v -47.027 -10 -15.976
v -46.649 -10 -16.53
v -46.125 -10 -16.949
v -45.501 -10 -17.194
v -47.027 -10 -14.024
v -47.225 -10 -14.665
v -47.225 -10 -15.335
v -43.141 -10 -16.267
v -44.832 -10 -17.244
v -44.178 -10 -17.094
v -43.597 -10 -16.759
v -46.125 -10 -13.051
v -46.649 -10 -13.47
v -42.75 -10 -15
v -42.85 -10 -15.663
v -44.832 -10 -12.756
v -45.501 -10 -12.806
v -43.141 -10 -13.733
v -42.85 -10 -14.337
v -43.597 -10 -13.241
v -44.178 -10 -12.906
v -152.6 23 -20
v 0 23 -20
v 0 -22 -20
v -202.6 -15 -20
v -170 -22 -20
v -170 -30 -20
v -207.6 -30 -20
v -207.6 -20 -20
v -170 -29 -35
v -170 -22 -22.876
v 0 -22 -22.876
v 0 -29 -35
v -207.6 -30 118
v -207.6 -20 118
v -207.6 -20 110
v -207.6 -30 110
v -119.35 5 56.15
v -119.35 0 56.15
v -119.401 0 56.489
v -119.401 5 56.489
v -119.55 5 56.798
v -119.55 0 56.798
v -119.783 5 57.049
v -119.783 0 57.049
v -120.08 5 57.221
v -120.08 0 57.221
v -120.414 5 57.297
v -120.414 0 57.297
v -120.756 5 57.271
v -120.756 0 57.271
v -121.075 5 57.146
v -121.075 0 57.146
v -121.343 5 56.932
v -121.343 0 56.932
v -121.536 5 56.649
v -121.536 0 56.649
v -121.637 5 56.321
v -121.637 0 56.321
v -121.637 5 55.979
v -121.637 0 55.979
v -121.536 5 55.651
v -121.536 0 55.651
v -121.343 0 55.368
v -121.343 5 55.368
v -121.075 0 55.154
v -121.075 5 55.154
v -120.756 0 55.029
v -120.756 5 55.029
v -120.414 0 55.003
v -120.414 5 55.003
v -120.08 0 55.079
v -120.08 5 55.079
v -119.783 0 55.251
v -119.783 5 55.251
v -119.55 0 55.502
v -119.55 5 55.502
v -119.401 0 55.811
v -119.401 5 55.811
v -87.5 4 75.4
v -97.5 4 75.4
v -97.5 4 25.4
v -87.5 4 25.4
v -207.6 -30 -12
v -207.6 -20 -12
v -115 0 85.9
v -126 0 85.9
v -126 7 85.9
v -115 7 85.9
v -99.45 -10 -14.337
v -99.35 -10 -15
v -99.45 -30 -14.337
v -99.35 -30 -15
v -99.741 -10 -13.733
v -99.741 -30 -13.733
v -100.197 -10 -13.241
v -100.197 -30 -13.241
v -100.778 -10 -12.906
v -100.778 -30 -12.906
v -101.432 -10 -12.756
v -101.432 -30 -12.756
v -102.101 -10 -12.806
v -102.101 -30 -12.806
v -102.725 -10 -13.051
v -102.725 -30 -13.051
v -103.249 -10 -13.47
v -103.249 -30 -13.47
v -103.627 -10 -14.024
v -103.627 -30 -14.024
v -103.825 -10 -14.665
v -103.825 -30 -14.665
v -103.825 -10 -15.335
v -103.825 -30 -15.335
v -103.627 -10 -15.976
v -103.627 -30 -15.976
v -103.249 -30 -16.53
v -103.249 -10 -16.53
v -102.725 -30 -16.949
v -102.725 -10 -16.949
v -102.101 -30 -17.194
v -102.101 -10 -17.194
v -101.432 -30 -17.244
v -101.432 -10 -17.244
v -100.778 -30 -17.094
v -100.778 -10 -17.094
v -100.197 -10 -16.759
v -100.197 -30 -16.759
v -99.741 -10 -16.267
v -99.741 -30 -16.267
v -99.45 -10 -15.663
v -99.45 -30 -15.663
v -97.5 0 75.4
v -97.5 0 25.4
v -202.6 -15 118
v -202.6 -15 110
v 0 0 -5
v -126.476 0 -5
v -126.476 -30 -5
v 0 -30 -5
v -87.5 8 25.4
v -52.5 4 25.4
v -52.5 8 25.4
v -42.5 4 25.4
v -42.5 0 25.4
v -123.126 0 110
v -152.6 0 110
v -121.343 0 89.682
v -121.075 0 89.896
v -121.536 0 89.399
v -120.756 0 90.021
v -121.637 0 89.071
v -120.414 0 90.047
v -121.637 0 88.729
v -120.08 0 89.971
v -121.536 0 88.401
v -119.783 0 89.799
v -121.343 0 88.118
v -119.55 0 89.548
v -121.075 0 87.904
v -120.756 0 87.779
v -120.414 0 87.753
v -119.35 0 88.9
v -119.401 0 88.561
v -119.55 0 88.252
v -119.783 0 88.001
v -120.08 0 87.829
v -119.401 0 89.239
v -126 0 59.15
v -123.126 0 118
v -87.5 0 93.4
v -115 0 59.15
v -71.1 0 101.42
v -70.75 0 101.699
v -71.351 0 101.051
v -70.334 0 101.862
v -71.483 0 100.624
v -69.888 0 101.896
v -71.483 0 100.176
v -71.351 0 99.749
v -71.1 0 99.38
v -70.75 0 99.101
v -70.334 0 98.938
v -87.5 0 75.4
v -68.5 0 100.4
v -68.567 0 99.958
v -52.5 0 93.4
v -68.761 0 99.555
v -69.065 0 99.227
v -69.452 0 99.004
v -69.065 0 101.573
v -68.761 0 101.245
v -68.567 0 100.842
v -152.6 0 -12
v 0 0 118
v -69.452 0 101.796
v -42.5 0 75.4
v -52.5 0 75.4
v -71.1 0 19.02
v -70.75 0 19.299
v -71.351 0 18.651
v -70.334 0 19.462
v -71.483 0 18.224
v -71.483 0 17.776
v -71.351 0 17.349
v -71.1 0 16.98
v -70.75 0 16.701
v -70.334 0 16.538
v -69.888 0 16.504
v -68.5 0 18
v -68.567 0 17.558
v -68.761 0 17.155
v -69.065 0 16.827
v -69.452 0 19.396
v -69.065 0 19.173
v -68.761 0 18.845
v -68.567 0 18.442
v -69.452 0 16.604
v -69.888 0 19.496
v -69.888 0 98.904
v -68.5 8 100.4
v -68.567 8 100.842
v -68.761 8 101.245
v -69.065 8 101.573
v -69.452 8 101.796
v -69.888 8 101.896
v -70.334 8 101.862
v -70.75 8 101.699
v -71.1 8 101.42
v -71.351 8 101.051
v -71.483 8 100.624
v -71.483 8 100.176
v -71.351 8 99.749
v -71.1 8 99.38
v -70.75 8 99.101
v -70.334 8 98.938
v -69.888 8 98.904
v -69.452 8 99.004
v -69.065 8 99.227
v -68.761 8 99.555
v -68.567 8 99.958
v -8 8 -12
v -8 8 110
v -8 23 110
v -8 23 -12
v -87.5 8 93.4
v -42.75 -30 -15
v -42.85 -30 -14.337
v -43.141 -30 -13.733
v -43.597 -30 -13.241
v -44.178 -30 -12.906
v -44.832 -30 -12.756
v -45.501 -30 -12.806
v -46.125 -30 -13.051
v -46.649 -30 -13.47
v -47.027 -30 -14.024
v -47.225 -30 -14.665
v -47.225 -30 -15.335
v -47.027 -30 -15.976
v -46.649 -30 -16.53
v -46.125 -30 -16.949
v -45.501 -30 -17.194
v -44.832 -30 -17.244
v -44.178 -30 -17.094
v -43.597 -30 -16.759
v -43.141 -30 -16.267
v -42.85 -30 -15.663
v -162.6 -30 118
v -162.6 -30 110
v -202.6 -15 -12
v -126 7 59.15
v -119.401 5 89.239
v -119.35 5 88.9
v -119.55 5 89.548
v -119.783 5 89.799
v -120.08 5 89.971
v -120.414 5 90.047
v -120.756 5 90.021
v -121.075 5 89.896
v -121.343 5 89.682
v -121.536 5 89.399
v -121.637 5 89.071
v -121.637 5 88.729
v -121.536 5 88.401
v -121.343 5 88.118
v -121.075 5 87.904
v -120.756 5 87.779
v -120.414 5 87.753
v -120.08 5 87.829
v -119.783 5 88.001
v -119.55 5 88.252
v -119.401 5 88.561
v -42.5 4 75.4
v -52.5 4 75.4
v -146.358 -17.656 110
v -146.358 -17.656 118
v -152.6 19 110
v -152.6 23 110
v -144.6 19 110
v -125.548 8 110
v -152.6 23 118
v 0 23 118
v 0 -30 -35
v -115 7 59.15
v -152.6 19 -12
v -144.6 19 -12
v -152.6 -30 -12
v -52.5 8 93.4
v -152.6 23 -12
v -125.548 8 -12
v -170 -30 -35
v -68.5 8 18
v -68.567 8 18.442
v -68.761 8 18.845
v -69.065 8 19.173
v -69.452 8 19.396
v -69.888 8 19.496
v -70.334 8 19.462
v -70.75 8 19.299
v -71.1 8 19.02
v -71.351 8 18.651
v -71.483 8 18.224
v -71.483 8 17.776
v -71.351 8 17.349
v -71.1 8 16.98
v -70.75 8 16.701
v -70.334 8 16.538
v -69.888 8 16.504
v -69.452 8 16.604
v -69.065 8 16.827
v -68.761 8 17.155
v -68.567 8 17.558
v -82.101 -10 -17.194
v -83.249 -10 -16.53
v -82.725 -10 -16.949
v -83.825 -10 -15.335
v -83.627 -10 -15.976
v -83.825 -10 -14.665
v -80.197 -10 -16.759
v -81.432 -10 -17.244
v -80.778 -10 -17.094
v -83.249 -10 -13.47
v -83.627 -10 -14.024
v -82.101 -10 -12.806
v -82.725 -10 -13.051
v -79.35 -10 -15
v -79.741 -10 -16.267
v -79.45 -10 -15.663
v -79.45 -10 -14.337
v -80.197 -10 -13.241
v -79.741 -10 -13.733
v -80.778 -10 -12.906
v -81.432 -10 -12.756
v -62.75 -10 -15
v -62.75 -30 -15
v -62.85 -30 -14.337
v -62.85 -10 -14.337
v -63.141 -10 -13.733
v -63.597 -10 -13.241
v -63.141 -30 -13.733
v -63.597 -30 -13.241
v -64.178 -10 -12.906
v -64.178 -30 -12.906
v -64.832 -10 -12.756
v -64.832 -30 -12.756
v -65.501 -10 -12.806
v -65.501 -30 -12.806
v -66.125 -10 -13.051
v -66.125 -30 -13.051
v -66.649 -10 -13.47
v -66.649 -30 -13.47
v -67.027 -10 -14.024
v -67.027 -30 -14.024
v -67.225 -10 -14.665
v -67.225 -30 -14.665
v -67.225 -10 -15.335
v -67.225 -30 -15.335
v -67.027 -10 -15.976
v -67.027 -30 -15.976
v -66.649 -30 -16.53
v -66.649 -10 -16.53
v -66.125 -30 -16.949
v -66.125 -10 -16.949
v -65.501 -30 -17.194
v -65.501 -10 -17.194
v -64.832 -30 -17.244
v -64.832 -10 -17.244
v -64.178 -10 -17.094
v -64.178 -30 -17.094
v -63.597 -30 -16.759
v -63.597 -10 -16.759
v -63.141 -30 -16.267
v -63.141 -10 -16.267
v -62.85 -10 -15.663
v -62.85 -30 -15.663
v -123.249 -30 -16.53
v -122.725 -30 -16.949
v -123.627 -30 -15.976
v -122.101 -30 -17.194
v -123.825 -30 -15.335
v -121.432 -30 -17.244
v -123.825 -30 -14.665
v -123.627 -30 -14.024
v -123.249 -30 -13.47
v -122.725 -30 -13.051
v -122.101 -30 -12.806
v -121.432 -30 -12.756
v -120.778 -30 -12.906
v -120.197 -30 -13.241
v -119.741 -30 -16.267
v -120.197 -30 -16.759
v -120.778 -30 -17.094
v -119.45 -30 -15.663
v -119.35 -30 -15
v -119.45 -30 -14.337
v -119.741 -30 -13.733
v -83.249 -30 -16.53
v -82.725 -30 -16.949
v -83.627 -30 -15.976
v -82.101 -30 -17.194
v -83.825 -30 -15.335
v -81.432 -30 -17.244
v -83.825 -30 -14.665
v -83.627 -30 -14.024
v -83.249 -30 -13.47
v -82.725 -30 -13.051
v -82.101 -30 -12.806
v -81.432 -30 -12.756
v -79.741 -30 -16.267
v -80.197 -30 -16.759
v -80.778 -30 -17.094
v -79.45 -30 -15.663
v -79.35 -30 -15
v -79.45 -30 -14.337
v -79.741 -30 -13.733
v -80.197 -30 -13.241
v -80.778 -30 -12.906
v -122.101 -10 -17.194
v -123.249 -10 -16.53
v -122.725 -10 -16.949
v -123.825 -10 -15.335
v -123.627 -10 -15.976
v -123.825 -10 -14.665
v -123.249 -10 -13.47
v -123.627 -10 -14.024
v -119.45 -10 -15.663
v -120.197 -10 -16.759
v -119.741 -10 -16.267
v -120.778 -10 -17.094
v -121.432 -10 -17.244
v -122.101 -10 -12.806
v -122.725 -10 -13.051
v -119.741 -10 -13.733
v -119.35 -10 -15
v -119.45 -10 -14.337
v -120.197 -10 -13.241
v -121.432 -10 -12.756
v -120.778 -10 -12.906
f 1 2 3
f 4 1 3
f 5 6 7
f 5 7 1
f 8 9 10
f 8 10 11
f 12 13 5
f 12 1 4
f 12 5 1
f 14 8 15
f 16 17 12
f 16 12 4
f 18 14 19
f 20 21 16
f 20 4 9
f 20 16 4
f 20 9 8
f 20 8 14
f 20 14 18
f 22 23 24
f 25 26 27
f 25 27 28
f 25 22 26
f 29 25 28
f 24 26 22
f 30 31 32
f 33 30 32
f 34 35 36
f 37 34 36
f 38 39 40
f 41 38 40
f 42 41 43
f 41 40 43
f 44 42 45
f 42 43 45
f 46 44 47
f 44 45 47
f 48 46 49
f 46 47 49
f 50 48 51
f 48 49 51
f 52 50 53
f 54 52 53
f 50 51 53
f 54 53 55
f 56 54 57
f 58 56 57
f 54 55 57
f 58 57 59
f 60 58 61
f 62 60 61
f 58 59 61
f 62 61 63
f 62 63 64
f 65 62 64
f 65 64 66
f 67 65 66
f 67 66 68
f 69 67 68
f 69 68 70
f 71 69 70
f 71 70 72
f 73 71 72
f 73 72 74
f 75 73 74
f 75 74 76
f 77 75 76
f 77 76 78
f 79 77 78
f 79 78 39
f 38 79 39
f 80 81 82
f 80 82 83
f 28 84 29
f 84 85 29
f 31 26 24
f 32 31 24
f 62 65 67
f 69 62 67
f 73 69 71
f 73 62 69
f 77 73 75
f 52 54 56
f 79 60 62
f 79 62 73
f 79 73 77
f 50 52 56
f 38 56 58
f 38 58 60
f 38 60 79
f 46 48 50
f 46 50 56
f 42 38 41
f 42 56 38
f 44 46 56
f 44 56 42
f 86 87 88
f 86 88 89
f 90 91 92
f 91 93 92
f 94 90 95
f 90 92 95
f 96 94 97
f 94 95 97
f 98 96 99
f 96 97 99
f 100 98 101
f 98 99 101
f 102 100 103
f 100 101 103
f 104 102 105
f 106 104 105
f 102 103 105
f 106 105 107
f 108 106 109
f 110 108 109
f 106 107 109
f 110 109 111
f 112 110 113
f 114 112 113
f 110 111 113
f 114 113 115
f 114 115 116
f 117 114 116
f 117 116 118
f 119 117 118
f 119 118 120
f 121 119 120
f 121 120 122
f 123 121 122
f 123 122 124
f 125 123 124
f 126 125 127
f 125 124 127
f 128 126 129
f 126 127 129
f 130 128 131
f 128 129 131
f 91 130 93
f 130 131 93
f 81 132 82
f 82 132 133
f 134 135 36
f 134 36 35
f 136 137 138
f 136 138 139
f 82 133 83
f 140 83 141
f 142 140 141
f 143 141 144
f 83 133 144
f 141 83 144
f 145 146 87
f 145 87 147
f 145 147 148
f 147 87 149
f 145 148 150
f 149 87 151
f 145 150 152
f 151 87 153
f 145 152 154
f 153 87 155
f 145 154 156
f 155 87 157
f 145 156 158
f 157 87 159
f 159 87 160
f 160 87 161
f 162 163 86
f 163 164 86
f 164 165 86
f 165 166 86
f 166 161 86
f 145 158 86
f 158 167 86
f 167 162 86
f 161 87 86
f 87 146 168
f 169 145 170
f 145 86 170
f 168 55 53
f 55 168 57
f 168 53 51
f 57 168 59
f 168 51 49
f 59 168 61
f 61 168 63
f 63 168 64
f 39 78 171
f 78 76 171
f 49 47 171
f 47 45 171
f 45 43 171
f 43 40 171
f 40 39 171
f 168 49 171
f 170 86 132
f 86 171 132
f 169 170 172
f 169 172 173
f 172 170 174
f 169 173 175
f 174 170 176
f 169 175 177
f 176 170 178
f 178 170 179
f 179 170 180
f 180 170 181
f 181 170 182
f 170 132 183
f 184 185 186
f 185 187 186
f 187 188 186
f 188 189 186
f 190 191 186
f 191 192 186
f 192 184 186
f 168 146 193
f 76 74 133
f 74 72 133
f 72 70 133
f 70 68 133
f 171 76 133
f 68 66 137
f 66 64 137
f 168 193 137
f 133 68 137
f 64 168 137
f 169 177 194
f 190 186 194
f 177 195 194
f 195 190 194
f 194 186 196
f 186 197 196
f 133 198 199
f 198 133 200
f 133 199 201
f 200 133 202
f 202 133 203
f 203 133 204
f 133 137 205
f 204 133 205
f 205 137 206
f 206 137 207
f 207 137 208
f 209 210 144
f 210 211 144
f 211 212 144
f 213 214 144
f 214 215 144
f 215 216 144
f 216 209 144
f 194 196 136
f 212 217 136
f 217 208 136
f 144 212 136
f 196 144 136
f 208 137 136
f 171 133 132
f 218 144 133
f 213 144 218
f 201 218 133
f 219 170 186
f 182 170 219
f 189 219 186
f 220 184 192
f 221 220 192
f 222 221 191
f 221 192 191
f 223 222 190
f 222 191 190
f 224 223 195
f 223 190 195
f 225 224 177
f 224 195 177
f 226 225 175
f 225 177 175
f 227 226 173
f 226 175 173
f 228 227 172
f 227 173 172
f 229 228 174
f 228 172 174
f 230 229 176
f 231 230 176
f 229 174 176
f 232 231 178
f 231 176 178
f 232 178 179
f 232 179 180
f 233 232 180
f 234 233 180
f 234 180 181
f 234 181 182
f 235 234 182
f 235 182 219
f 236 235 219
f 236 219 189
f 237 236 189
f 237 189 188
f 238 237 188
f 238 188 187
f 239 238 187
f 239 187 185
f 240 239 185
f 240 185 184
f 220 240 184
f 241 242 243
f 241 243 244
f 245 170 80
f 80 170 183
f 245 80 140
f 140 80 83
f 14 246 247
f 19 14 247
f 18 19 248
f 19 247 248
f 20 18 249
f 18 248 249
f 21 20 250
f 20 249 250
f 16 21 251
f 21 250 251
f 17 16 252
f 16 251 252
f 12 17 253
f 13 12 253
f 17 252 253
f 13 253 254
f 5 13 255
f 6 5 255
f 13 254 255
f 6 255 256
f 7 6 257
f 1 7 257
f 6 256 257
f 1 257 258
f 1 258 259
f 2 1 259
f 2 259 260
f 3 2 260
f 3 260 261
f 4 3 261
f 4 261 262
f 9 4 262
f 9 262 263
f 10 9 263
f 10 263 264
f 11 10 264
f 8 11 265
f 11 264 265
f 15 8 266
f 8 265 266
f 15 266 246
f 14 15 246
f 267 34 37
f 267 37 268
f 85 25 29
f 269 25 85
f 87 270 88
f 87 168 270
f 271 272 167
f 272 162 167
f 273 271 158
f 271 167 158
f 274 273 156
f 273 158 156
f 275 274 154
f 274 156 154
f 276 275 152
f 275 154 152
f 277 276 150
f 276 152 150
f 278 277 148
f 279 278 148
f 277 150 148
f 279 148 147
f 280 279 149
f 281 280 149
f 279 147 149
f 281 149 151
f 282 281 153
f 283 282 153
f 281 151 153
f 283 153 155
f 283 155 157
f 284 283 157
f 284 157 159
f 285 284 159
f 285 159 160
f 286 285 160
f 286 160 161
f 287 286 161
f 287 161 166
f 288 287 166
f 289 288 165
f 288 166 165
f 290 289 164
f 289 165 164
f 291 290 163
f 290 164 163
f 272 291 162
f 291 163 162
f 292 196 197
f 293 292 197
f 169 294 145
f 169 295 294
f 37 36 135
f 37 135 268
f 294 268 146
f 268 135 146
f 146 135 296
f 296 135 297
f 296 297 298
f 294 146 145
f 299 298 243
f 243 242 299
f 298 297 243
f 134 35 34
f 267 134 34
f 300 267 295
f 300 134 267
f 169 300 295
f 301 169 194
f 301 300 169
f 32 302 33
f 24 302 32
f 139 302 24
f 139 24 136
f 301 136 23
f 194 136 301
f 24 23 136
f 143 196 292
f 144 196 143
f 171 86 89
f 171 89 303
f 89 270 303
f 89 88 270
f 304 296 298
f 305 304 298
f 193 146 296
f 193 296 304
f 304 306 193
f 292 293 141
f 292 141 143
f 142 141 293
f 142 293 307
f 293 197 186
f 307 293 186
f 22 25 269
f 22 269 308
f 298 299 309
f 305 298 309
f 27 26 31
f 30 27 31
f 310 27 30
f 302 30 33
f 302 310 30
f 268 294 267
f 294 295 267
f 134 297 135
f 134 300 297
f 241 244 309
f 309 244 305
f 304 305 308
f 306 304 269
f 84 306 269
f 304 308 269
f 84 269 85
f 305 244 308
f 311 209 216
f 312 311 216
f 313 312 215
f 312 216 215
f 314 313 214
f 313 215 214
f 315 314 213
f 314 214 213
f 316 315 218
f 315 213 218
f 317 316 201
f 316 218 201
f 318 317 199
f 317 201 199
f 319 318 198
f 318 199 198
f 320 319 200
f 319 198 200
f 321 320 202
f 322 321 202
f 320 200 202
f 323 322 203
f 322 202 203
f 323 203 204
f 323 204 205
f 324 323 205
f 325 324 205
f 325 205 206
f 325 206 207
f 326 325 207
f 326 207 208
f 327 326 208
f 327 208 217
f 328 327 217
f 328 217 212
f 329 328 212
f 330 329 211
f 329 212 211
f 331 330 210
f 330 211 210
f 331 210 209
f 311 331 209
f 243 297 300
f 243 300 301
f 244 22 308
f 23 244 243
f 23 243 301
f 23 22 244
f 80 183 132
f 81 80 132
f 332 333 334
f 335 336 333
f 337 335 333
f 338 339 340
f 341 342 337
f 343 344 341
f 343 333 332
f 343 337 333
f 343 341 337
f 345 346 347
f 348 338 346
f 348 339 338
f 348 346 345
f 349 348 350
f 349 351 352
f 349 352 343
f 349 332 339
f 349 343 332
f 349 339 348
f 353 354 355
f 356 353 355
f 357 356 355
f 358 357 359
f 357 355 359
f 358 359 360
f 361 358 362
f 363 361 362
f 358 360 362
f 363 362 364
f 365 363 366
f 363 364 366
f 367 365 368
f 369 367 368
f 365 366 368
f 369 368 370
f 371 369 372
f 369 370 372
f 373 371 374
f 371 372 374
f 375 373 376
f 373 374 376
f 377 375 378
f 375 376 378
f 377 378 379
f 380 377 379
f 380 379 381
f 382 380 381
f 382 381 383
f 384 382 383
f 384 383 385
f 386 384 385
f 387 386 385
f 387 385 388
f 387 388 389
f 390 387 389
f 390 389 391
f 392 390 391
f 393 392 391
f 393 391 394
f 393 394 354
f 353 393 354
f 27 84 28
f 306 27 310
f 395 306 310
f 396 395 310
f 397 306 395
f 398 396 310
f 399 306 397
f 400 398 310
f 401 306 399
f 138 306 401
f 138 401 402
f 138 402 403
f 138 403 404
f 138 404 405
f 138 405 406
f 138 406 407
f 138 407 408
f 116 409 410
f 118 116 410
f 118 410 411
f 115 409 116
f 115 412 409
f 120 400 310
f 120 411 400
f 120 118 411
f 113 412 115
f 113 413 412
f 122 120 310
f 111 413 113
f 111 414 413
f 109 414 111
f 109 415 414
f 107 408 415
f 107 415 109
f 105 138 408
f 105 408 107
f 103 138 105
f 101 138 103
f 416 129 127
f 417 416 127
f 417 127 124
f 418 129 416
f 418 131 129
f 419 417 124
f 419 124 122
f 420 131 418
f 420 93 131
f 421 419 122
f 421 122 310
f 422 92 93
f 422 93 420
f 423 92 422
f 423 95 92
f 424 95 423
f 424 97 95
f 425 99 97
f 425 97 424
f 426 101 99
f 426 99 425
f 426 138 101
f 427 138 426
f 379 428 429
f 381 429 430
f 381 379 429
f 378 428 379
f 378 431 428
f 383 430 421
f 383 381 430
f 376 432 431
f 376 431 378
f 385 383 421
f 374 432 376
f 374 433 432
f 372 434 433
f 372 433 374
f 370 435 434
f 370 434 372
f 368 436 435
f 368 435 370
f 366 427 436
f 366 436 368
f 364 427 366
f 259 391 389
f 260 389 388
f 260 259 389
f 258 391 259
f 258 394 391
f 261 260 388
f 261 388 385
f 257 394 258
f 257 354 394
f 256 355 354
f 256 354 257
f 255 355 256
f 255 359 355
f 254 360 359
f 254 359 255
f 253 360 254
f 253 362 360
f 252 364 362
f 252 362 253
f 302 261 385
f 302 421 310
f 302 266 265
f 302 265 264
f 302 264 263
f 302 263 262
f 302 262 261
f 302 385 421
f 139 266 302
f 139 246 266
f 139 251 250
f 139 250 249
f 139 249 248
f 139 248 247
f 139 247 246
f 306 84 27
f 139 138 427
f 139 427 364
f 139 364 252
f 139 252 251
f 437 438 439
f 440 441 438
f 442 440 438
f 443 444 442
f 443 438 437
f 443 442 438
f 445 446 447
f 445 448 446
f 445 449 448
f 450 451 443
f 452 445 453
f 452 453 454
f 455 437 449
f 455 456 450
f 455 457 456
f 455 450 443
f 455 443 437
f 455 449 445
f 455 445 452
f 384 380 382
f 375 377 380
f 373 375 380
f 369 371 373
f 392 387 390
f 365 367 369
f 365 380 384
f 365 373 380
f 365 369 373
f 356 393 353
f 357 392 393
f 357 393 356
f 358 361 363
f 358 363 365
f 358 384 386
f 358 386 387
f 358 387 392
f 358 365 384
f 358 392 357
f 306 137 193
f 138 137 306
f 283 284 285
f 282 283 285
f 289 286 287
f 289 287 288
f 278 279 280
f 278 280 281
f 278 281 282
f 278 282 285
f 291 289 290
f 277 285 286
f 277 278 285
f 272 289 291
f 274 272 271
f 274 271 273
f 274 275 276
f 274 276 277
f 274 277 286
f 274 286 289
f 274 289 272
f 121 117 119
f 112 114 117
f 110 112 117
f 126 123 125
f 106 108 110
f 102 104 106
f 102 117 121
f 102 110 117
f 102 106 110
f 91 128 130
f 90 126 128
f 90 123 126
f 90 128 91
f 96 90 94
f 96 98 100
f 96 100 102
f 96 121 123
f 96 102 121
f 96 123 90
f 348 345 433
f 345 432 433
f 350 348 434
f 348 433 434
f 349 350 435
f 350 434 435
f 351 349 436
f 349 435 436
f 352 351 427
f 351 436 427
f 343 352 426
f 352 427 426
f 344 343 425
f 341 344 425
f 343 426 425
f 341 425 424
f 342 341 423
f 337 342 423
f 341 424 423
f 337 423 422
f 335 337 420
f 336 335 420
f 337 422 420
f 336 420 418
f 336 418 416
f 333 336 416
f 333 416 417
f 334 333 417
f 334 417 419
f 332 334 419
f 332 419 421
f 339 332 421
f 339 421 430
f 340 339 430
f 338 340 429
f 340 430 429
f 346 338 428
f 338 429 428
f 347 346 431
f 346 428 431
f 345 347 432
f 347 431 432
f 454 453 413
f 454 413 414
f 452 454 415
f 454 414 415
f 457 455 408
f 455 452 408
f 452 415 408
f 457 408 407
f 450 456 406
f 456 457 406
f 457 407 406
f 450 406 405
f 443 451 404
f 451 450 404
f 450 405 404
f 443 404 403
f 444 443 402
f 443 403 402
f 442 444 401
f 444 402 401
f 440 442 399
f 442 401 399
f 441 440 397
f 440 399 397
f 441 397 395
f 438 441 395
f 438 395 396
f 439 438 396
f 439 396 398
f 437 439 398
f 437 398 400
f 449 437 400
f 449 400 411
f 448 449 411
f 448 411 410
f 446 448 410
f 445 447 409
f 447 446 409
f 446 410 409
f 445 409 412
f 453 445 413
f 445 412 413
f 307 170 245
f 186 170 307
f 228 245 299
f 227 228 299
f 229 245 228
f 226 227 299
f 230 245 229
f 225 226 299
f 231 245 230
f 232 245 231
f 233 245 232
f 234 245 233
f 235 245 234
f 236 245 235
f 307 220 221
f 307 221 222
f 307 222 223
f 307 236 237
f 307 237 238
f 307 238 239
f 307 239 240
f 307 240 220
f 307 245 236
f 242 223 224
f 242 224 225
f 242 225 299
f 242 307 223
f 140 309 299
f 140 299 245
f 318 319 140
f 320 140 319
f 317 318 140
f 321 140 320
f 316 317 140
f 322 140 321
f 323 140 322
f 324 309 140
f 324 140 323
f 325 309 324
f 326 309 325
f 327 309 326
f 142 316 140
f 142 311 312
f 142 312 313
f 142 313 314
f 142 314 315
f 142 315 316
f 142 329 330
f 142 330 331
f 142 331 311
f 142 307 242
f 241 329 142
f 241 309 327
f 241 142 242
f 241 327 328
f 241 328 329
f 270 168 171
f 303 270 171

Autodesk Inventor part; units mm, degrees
ref_plane "YZ Plane" through (0, 0, 0) normal (1, 0, 0) x (0, 1, 0)
ref_plane "XZ Plane" through (0, 0, 0) normal (0, 1, 0) x (-1, 0, 0)
sketch "Sketch1" plane through (0, 0, 0) normal (0, 1, 0) x (-1, 0, 0)
  line L0 (0, 0) -> (159.6, 0)
  line L1 (159.6, 46) -> (159.6, 118)
  line L2 (159.6, 118) -> (0, 118)
  line L3 (0, 118) -> (0, 0)
  line L4 (159.6, 118) -> (159.6, 46)
  line L5 (0, 0) -> (113, 0)
  line L6 (113, 0) -> (159.6, 46)
  line L7 (159.6, 118) -> (167.6, 118)
  line L8 (167.6, 118) -> (167.6, 46)
  line L9 (167.6, 46) -> (159.6, 46)
  line L10 (159.6, 46) -> (159.6, 118)
  line L11 (113, 0) -> (0, 0)
  line L12 (0, 0) -> (0, -8)
  line L13 (0, -8) -> (113, -8)
  line L14 (113, -8) -> (113, 0)
  line L15 (0, 0) -> (0, 10)
  line L16 (0, 10) -> (9, 10)
  circle A0 centre (9, 10) radius 2.25
  line L17 (159.6, 118) -> (159.6, 89)
  line L18 (159.6, 89) -> (149.6, 89)
  circle A1 centre (149.6, 89) radius 2.25
  line L19 (159.6, 118) -> (159.6, 0)
  dimension "d0" = 159.6
  dimension "d2" = 72
  dimension "d3" = 113
  dimension "d4" = 8
  dimension "d5" = 8
  dimension "d6" = 10
  dimension "d7" = 9
  dimension "d8" = 4.5
  dimension "d9" = 29
  dimension "d10" = 10
  dimension "d11" = 4.5
  dimension "d14" = 118
extrude "Extrusion2" add sketch "Sketch1" along normal blind 8 contours L3 L2 L1 L6 L0 | L0 L14 L13 L12 | L1 L7 L8 L9
sketch "Sketch2" plane through (0, 8, 0) normal (0, 1, 0) x (1, 0, 0)
  line L0 (-113, 8) -> (-113, 0) projected
  line L1 (-159.6, -46) -> (-113, 0)
  line L2 (-113, 0) -> (-94.4074, 18.3532)
  line L3 (-113, 0) -> (-159.6, -46) projected
  line L4 (-113, 0) -> (-159.6, -46)
  line L5 (-159.6, -46) -> (-175.759, -61.951)
  line L6 (-175.759, -61.951) -> (-174.3006, -39.4963)
  line L7 (-174.3006, -39.4963) -> (-106.8014, 20.2158)
  line L8 (-106.8014, 20.2158) -> (-94.4074, 18.3532)
  point P0 (0, 0)
extrude "Extrusion3" cut sketch "Sketch2" against normal blind 10
sketch "Sketch3" plane through (0, 0, 0) normal (0, -1, 0) x (1, 0, 0)
  line L0 (-167.6, 118) -> (0, 118) projected
  line L1 (-167.6, 118) -> (-167.6, 92.4)
  line L2 (-167.6, 53.897) -> (-167.6, 118) projected
  line L3 (-167.6, 92.4) -> (-128, 92.4)
  line L4 (-128, 92.4) -> (-120.5, 92.4)
  line L5 (-120.5, 92.4) -> (-120.5, 88.9)
  line L6 (-120.5, 88.9) -> (-128, 88.9)
  line L7 (-128, 88.9) -> (-128, 92.4)
  line L8 (-120.5, 88.9) -> (-120.5, 56.15)
  line L9 (-120.5, 88.9) -> (-87.75, 88.9) construction
  circle A0 centre (-120.5, 88.9) radius 1.15
  circle A1 centre (-120.5, 56.15) radius 1.15
  line L10 (-120.5, 88.9) -> (-120.5, 90.9)
  line L11 (-120.5, 88.9) -> (-120.5, 85.9)
  line L12 (-120.5, 56.15) -> (-120.5, 59.15)
  line L13 (-120.5, 59.15) -> (-115, 59.15)
  line L14 (-120.5, 85.9) -> (-126, 85.9)
  line L15 (-126, 85.9) -> (-115, 85.9)
  line L16 (-115, 85.9) -> (-115, 59.15)
  line L17 (-115, 59.15) -> (-126, 59.15)
  line L18 (-126, 59.15) -> (-126, 85.9)
  point P0 (0, 0)
  dimension "d19" = 25.6
  dimension "d20" = 39.6
  dimension "d21" = 7.5
  dimension "d22" = 3.5
  dimension "d23" = 32.75
  dimension "d24" = 90
  dimension "d25" = 2.3
  dimension "d26" = 2.3
  dimension "d29" = 2
  dimension "d30" = 3
  dimension "d31" = 3
  dimension "d32" = 5.5
  dimension "d33" = 5.5
extrude "Extrusion4" cut sketch "Sketch3" against normal blind 5 contours A0 L5 L6 | L6 L8 A0 | A0 L8 L5 | A1
sketch "Sketch5" plane through (0, 8, 0) normal (0, 1, 0) x (1, 0, 0)
  circle A0 centre (-9, -10) radius 2.25 projected
  circle A1 centre (-149.6, -89) radius 2.25 projected
  line L0 (-9, -10) -> (-149.6, -89)
  line L1 (-149.6, -89) -> (-116.8523, -147.2827)
  line L2 (-116.8523, -147.2827) -> (-175.4275, -43.0335)
  line L3 (-149.6, -89) -> (-9, -10)
  line L4 (-79.3, -49.5) -> (-9, -10)
  line L5 (-149.6, -89) -> (-144.7015, -97.7181)
  line L6 (-116.8523, -147.2827) -> (-175.4275, -43.0335)
  line L7 (-175.4275, -43.0335) -> (-34.8275, 35.9665)
  line L8 (-34.8275, 35.9665) -> (23.7477, -68.2827)
  line L9 (23.7477, -68.2827) -> (-116.8523, -147.2827)
  circle A2 centre (-9, -10) radius 4.5 projected
  line L10 (-9, -10) -> (-4.1015, -18.7181)
  line L11 (-4.1015, -18.7181) -> (-1.6523, -23.0771)
  line L12 (-1.6523, -23.0771) -> (8.1447, -40.5133)
  line L13 (8.1447, -40.5133) -> (10.594, -44.8723)
  line L14 (-144.7015, -97.7181) -> (-142.2523, -102.0771)
  line L15 (-142.2523, -102.0771) -> (-132.4553, -119.5133)
  line L16 (-132.4553, -119.5133) -> (-130.006, -123.8723)
  line L17 (-149.6, -89) -> (-154.4985, -80.2819)
  line L18 (-154.4985, -80.2819) -> (-156.9477, -75.9229)
  line L19 (-9, -10) -> (-13.8985, -1.2819)
  line L20 (-13.8985, -1.2819) -> (-16.3477, 3.0771)
  line L21 (-167.6, -53.897) -> (-167.6, -118) projected
  line L22 (-167.6, -118) -> (0, -118)
  line L23 (0, -118) -> (0, 8)
  line L24 (0, 8) -> (-167.6, 8)
  line L25 (-167.6, 8) -> (-167.6, -118)
  line L26 (-16.3477, 3.0771) -> (-156.9477, -75.9229)
  line L27 (-154.4985, -80.2819) -> (-13.8985, -1.2819)
  line L28 (-4.1015, -18.7181) -> (-144.7015, -97.7181)
  line L29 (-142.2523, -102.0771) -> (-1.6523, -23.0771)
  line L30 (8.1447, -40.5133) -> (-132.4553, -119.5133)
  line L31 (-130.006, -123.8723) -> (10.594, -44.8723)
  line L32 (-4.1015, -18.7181) -> (7.818, -12.0208)
  line L33 (-1.6523, -23.0771) -> (4.3075, -19.7285)
  line L34 (-13.8985, -1.2819) -> (7.818, 10.9201)
  line L35 (-16.3477, 3.0771) -> (3.62, 14.2965)
  line L36 (-144.7015, -97.7181) -> (-142.2523, -102.0771)
  line L37 (-142.2523, -102.0771) -> (-178.8351, -122.6322)
  line L38 (-178.8351, -122.6322) -> (-181.2843, -118.2731)
  line L39 (-181.2843, -118.2731) -> (-144.7015, -97.7181)
  line L40 (-154.4985, -80.2819) -> (-156.9477, -75.9229)
  line L41 (-156.9477, -75.9229) -> (-183.573, -90.883)
  line L42 (-183.573, -90.883) -> (-181.1237, -95.242)
  line L43 (-181.1237, -95.242) -> (-154.4985, -80.2819)
  line L44 (0, 8) -> (-104.8957, 8) projected
  line L45 (0, 8) -> (-5, 8)
  line L46 (-5, 8) -> (-5, 3)
  line L47 (-5, 3) -> (0, 3)
  line L48 (0, 3) -> (0, 8)
  line L49 (-104.8957, 8) -> (-167.6, -53.897) projected
  line L50 (-104.8957, 8) -> (-167.6, -53.897)
  line L51 (-167.6, -53.897) -> (-164.0874, -57.4554)
  line L52 (-164.0874, -57.4554) -> (-101.3831, 4.4416)
  line L53 (-101.3831, 4.4416) -> (-104.8957, 8)
  line L54 (0, -118) -> (0, 8) projected
  line L55 (0, 3) -> (0, 8)
  line L56 (0, 8) -> (-113.2487, 8)
  line L57 (-113.2487, 8) -> (-113.2487, 3)
  line L58 (-113.2487, 3) -> (0, 3)
  line L59 (-5, 8) -> (0, 8)
  line L60 (0, 8) -> (0, -118)
  line L61 (0, -118) -> (-5, -118)
  line L62 (-5, -118) -> (-5, 8)
  line L63 (-167.6, -118) -> (0, -118) projected
  line L64 (-167.6, -118) -> (-162.6, -118)
  line L65 (-162.6, -118) -> (-162.6, -39.4397)
  line L66 (-162.6, -39.4397) -> (-167.6, -39.4397)
  line L67 (-167.6, -39.4397) -> (-167.6, -118)
  line L68 (-167.6, -118) -> (0, -118) projected
  line L69 (0, -118) -> (-186.0038, -118)
  line L70 (-186.0038, -118) -> (-186.0038, -113)
  line L71 (-186.0038, -113) -> (0, -113)
  line L72 (0, -113) -> (0, -118)
  point P0 (0, 0)
  point P1 (-162.6, -107.7748)
  point P2 (-162.6, -84.834)
  point P3 (-6.2777, 3)
  point P4 (-5, -7.9384)
  point P5 (-5, -12.0616)
  point P6 (-5, -19.2229)
  point P7 (-5, -24.9581)
  point P8 (-5, -47.899)
  point P9 (-120.8633, -113)
  point P10 (-161.6922, -113)
  point P11 (-162.6, -113.51)
  point P12 (-162.6, -113)
  point P13 (-5, -113)
  point P14 (-110.6561, -113)
  point P15 (-5, -53.6342)
  point P16 (-162.6, -79.0988)
  point P17 (-162.6, -55.9871)
  point P18 (-102.8435, 3)
  point P19 (-16.485, 3)
  point P20 (-16.3044, 3)
  dimension "d45" = 10
  dimension "d46" = 10
  dimension "d47" = 5
  dimension "d48" = 20
  dimension "d49" = 5
  dimension "d50" = 5
  dimension "d51" = 20
  dimension "d52" = 5
  dimension "d53" = 10
  dimension "d54" = 5
  dimension "d55" = 10
  dimension "d56" = 5
  dimension "d57" = 5
  dimension "d58" = 5
  dimension "d59" = 5
  dimension "d60" = 5
  dimension "d61" = 5
extrude "Extrusion7" cut sketch "Sketch3" against normal blind 7 contours L15 L16 L13 L8 | L8 L17 L18 L14
sketch "Sketch7" plane through (0, 0, 0) normal (0, -1, 0) x (1, 0, 0)
  line L0 (-167.6, 118) -> (0, 118) projected
  line L1 (0, 118) -> (-70, 118)
  line L2 (-70, 118) -> (-70, 100.4)
  line L3 (-70, 100.4) -> (-70, 18)
  circle A0 centre (-70, 100.4) radius 1.5
  circle A1 centre (-70, 18) radius 1.5
  point P0 (0, 0)
  dimension "d66" = 70
  dimension "d67" = 17.6
  dimension "d68" = 82.4
  dimension "d69" = 3
  dimension "d70" = 3
extrude "Extrusion8" cut sketch "Sketch7" against normal blind 30
sketch "Sketch8" plane through (0, 0, 0) normal (0, -1, 0) x (1, 0, 0)
  circle A0 centre (-70, 100.4) radius 1.5 projected
  line L0 (-70, 100.4) -> (-70, 93.4)
  line L1 (-70, 93.4) -> (-52.5, 93.4)
  line L2 (-52.5, 93.4) -> (-87.5, 93.4)
  line L3 (-87.5, 93.4) -> (-87.5, 25.4)
  line L4 (-87.5, 25.4) -> (-52.5, 25.4)
  line L5 (-52.5, 25.4) -> (-52.5, 93.4)
  point P0 (0, 0)
  dimension "d73" = 7
  dimension "d74" = 17.5
  dimension "d75" = 35
  dimension "d76" = 68
extrude "Extrusion9" cut sketch "Sketch8" against normal blind 23 contours L1 L5 L4 L3 L2
extrude "Extrusion10" add sketch "Sketch5" along normal blind 15 contours L62 L47 L23 L32 L8 A2 | L8 L28 L62 | L8 L35 L24 L46 L34 L58 | L34 L46 L58 | L46 L34 L23 L47 | L32 L23 L33 L8 | L8 L29 L62 L28 | L26 L58 L7 L24 L8 | L8 L24 L35 | L65 L39 L21 L43 | L43 L21 L41 L65 | L46 L24 L23 L34 | L33 L23 L8 | L8 L23 L30 L62 L29 | L58 L52 L53 L24 L7 | L65 L41 L21 L2 | L2 L21 L51 L52 L65 | L65 L71 L21 L39 | L30 L23 L31 L62 | L52 L65 L49 L7 | L7 L49 L58 L52 | L58 L49 L53 L52 | L52 L51 L49 L65 | L71 L37 L65 | L65 L37 L21 L71 | L71 L30 L22 L1 | L1 L22 L65 L37 L71 | L71 L31 L22 L30 | L31 L23 L9 L62 | L65 L22 L21 L37 | L71 L9 L22 L31 | L9 L23 L71 L62 | L71 L62 L22 L9 | L71 L23 L22 L62
sketch "Sketch10" plane through (0, 0, 0) normal (0, -1, 0) x (1, 0, 0)
  line L0 (-52.5, 93.4) -> (-87.5, 93.4) projected
  line L1 (-70, 93.4) -> (-42.5, 93.4)
  line L2 (-42.5, 93.4) -> (-42.5, 75.4)
  line L3 (-42.5, 75.4) -> (-42.5, 25.4)
  line L4 (-42.5, 75.4) -> (-97.5, 75.4)
  line L5 (-97.5, 75.4) -> (-97.5, 25.4)
  line L6 (-97.5, 25.4) -> (-42.5, 25.4)
  line L7 (-42.5, 25.4) -> (-42.5, 75.4)
  point P0 (0, 0)
  point P1 (-42.5, 25.4)
  dimension "d81" = 27.5
  dimension "d82" = 18
  dimension "d83" = 50
  dimension "d84" = 55
  dimension "d87" = 50
extrude "Extrusion11" cut sketch "Sketch10" against normal blind 4
sketch "Sketch11" plane through (0, 8, 0) normal (0, 1, 0) x (1, 0, 0)
  line L0 (-162.6, -55.9871) -> (-102.8435, 3) projected
  line L1 (-162.6, -55.9871) -> (-102.8435, -55.9871)
  line L2 (-102.8435, -55.9871) -> (-102.8435, 3)
  line L3 (-102.8435, 3) -> (-162.6, 3)
  line L4 (-162.6, 3) -> (-162.6, -55.9871)
  point P0 (0, 0)
extrude "Extrusion12" cut sketch "Sketch11" along normal blind 20 contours L4 L3 L0
sketch "Sketch12" plane through (0, 8, 0) normal (0, 1, 0) x (1, 0, 0)
  line L0 (0, 8) -> (-104.8957, 8) projected
  line L1 (-167.6, -53.897) -> (-104.8957, -53.897)
  line L2 (-104.8957, -53.897) -> (-104.8957, 8)
  line L3 (-104.8957, 8) -> (-167.6, 8)
  line L4 (-167.6, 8) -> (-167.6, -53.897)
  line L5 (-104.8957, 8) -> (-109.9609, 3) projected
  line L6 (-162.6, -48.9614) -> (-109.9609, 3) projected
  line L7 (-109.9609, 3) -> (-162.6, 3)
  line L8 (-162.6, 3) -> (-162.6, -48.9614)
  line L9 (-162.6, -48.9614) -> (-109.9609, -48.9614)
  line L10 (-109.9609, -48.9614) -> (-109.9609, 3)
  point P0 (0, 0)
extrude "Extrusion13" add sketch "Sketch12" against normal blind 8 contours L8 L7 L6
sketch "Sketch13" plane through (0, 8, 0) normal (0, 1, 0) x (1, 0, 0)
  line L0 (-104.8957, 8) -> (-109.9609, 3) projected
  line L1 (-167.6, -53.897) -> (-167.6, -118) projected
  line L2 (-104.8957, 8) -> (-167.6, 8)
  line L3 (-167.6, 8) -> (-167.6, -53.897)
  line L4 (-167.6, -53.897) -> (-104.8957, -53.897)
  line L5 (-104.8957, -53.897) -> (-104.8957, 8)
  line L6 (-167.6, -53.897) -> (-162.6, -48.9614) projected
  line L7 (-109.9609, 3) -> (-162.6, 3)
  line L8 (-162.6, 3) -> (-162.6, -48.9614)
  line L9 (-162.6, -48.9614) -> (-109.9609, -48.9614)
  line L10 (-109.9609, -48.9614) -> (-109.9609, 3)
  point P0 (0, 0)
extrude "Extrusion14" add sketch "Sketch13" along normal blind 15 contours L0 L7 L8 L6 L3 L2
extrude "Extrusion15" add sketch "Sketch13" against normal blind 8 contours L0 L7 L8 L6 L3 L2
sketch "Sketch14" plane through (0, 8, 0) normal (0, 1, 0) x (1, 0, 0)
  circle A0 centre (-9, -10) radius 2.25 projected
  circle A1 centre (-9, -10) radius 2.25
  circle A2 centre (-149.6, -89) radius 2.25 projected
  circle A3 centre (-149.6, -89) radius 2.25
  point P0 (0, 0)
extrude "Extrusion16" add sketch "Sketch14" against normal blind 8
sketch "Sketch15" plane through (-162.6, 8, -3) normal (0, 0, 1) x (1, 0, 0)
  line L0 (0, 0) -> (0, 15) projected
  line L1 (0, 0) -> (187.1145, 0)
  line L2 (187.1145, 0) -> (187.1145, 32.8741)
  line L3 (187.1145, 32.8741) -> (0, 32.8741)
  line L4 (0, 32.8741) -> (0, 0)
  line L5 (0, 0) -> (-28.6153, 0)
  line L6 (-28.6153, 0) -> (-28.6153, 26.9098)
  line L7 (-28.6153, 26.9098) -> (0, 26.9098)
  line L8 (0, 26.9098) -> (0, 0)
  point P0 (162.6, -8)
extrude "Extrusion17" cut sketch "Sketch15" along normal mid plane 900
sketch "Sketch16" plane through (0, 8, 0) normal (0, 1, 0) x (1, 0, 0)
  line L0 (-167.6, 8) -> (0, 8) projected
  line L1 (0, 8) -> (-167.6, 8)
  line L2 (-167.6, 8) -> (-167.6, 20)
  line L3 (-167.6, 20) -> (0, 20)
  line L4 (0, 20) -> (0, 8)
  point P0 (0, 0)
  dimension "d100" = 12
extrude "Extrusion18" add sketch "Sketch16" against normal blind 8
sketch "Sketch17" plane through (0, 0, 0) normal (0, -1, 0) x (1, 0, 0)
  line L0 (-167.6, 118) -> (0, 118) projected
  line L1 (-167.6, -20) -> (0, -20) projected
  line L2 (-167.6, 118) -> (-152.6, 118)
  line L3 (-152.6, 118) -> (-152.6, -20)
  line L4 (-152.6, -20) -> (-167.6, -20)
  line L5 (-167.6, -20) -> (-167.6, 118)
  point P0 (0, 0)
  dimension "d103" = 15
extrude "Extrusion19" cut sketch "Sketch17" against normal blind 8
sketch "Sketch18" plane through (0, 0, 0) normal (0, -1, 0) x (1, 0, 0)
  line L0 (0, -20) -> (-152.6, -20) projected
  line L1 (-152.6, -20) -> (-152.6, 118) projected
  line L2 (0, -20) -> (-152.6, -20)
  line L3 (-152.6, -20) -> (-152.6, -5)
  line L4 (-152.6, -5) -> (0, -5)
  line L5 (0, -5) -> (0, -20)
  line L6 (-152.6, 118) -> (-137.6, 118)
  line L7 (-137.6, 118) -> (-137.6, -5)
  line L8 (-137.6, -5) -> (-152.6, -5)
  line L9 (-152.6, -5) -> (-152.6, 118)
  point P0 (0, 0)
  dimension "d106" = 15
  dimension "d107" = 15
extrude "Extrusion20" add sketch "Sketch18" along normal blind 30
sketch "Sketch19" plane through (-152.6, 8, -20) normal (-1, 0, 0) x (0, 0, 1)
  line L0 (138, 0) -> (138, -38) projected
  line L1 (0, -38) -> (138, -38)
  line L2 (138, -38) -> (138, -23)
  line L3 (138, -23) -> (0, -23)
  line L4 (0, -23) -> (0, -38)
  point P0 (20, -8)
  dimension "d110" = 15
extrude "Extrusion21" add sketch "Sketch19" along normal blind 70
ref_plane "Work Plane1" through (0, 0, 49) normal (0, 0, 1) x (1, 0, 0)
sketch "Sketch21" plane through (0, 8, 0) normal (0, 1, 0) x (1, 0, 0)
  line L0 (0, 20) -> (-152.6, 20) projected
  line L1 (0, 20) -> (-8, 20)
  line L2 (-8, 20) -> (-8, 12)
  line L3 (-8, 12) -> (0, 12)
  line L4 (0, 12) -> (0, 20)
  line L5 (0, -118) -> (-152.6, -118) projected
  line L6 (-152.6, -118) -> (-144.6, -118)
  line L7 (-144.6, -118) -> (-144.6, -110)
  line L8 (-144.6, -110) -> (-152.6, -110)
  line L9 (-152.6, -110) -> (-152.6, -118)
  line L10 (-144.6, -110) -> (-8, -110)
  line L11 (-8, -110) -> (-8, 12)
  line L12 (-8, 12) -> (-144.6, 12)
  line L13 (-144.6, 12) -> (-144.6, -110)
  line L14 (0, 20) -> (-152.6, 20)
  line L15 (-152.6, 20) -> (-152.6, -118)
  line L16 (-152.6, -118) -> (0, -118)
  line L17 (0, -118) -> (0, 20)
  point P0 (0, 0)
  dimension "d116" = 8
  dimension "d117" = 8
  dimension "d118" = 8
  dimension "d119" = 8
extrude "Extrusion23" add sketch "Sketch21" along normal blind 15 contours L4 L3 L2 L0 | L2 L12 L13 L8 L15 L0 | L17 L5 L7 L10 L11 L3 | L8 L7 L5 L9
sketch "Sketch22" plane through (-137.6, 0, 118) normal (0, 0, 1) x (1, 0, 0)
  line L0 (-15, -15) -> (-15, 23) projected
  line L1 (-15, -15) -> (-85, -15) projected
  line L2 (-15, 23) -> (-65, 23)
  line L3 (-65, 23) -> (-65, -15)
  line L4 (-65, -15) -> (-15, -15)
  line L5 (-15, -15) -> (-15, 23)
  line L6 (-15, 23) -> (-65, -15)
  point P0 (137.6, 0)
  dimension "d123" = 50
extrude "Extrusion24" add sketch "Sketch22" against normal blind 8 contours L1 L6 L0
mirror "Mirror2" about plane through (0, 0, 49) normal (0, 0, 1) of "Extrusion24"
sketch "Sketch23" plane through (0, -30, 0) normal (0, -1, 0) x (1, 0, 0)
  line L0 (0, -20) -> (0, -5) projected
  line L1 (0, -20) -> (-170, -20)
  line L2 (-170, -20) -> (-170, -35)
  line L3 (-170, -35) -> (0, -35)
  line L4 (0, -35) -> (0, -20)
  point P0 (0, 0)
  dimension "d126" = 170
  dimension "d127" = 15
extrude "Extrusion25" add sketch "Sketch23" against normal blind 8
sketch "Sketch24" plane through (-222.6, -15, 118) normal (0, 1, 0) x (1, 0, 0)
  line L0 (85, 0) -> (0, 0) projected
  line L1 (52.6, 138) -> (0, 138) projected
  line L2 (0, 0) -> (15, 0)
  line L3 (15, 0) -> (15, 138)
  line L4 (15, 138) -> (0, 138)
  line L5 (0, 138) -> (0, 0)
  point P0 (222.6, 118)
  dimension "d130" = 15
extrude "Extrusion26" cut sketch "Sketch24" against normal blind 100
sketch "Sketch25" plane through (0, -30, 0) normal (0, -1, 0) x (1, 0, 0)
  line L0 (0, -5) -> (-137.6, -5) projected
  line L1 (0, -5) -> (-45, -5)
  line L2 (-45, -5) -> (-45, -15)
  line L3 (-45, -15) -> (0, -15)
  line L4 (0, -15) -> (0, -5)
  circle A0 centre (-45, -15) radius 2.25
  point P0 (0, 0)
  dimension "d133" = 45
  dimension "d134" = 10
  dimension "d135" = 4.5
sketch "Sketch26" plane through (0, -30, 0) normal (0, -1, 0) x (1, 0, 0)
  line L0 (-170, -20) -> (-207.6, -20) projected
  line L1 (-207.6, -20) -> (-121.6, -20)
  line L2 (-121.6, -20) -> (-121.6, -15)
  line L3 (0, -5) -> (-137.6, -5) projected
  circle A0 centre (-121.6, -15) radius 2.25
  point P0 (0, 0)
  dimension "d136" = 86
  dimension "d137" = 5
  dimension "d138" = 4.5
extrude "Extrusion27" cut sketch "Sketch26" against normal blind 20
extrude "Extrusion28" cut sketch "Sketch25" against normal blind 20 contours A0 L3 L2 | L2 L3 A0
sketch "Sketch27" plane through (0, -30, 0) normal (0, -1, 0) x (1, 0, 0)
  circle A0 centre (-121.6, -15) radius 2.25 projected
  line L0 (-121.6, -15) -> (-101.6, -15)
  line L1 (-101.6, -15) -> (-81.6, -15)
  circle A1 centre (-45, -15) radius 2.25 projected
  line L2 (-45, -15) -> (-65, -15)
  circle A2 centre (-101.6, -15) radius 2.25
  circle A3 centre (-81.6, -15) radius 2.25
  circle A4 centre (-65, -15) radius 2.25
  point P0 (0, 0)
  dimension "d143" = 20
  dimension "d144" = 20
  dimension "d145" = 20
  dimension "d146" = 4.5
  dimension "d147" = 4.5
  dimension "d148" = 4.5
extrude "Extrusion29" cut sketch "Sketch27" against normal blind 20 contours A2 L1 L0 | L0 L1 A2 | A3 | A4
sketch "Sketch28" plane through (-202.6, -15, 110) normal (0, 1, 0) x (1, 0, 0)
  line L0 (0, 122) -> (50, 122) projected
  line L1 (50, 122) -> (-30.0077, 122)
  line L2 (-30.0077, 122) -> (-30.0077, 0)
  line L3 (-30.0077, 0) -> (50, 0)
  line L4 (50, 0) -> (50, 122)
  point P0 (202.6, 110)
extrude "Extrusion30" cut sketch "Sketch28" against normal blind 100
sketch "Sketch29" plane through (-137.6, 0, 118) normal (1, 0, 0) x (0, 0, -1)
  line L0 (0, 0) -> (0, -30) projected
  line L1 (8, 23) -> (8, -30) projected
  line L2 (0, 0) -> (8, 0)
  line L3 (8, 0) -> (8, -30)
  line L4 (8, -30) -> (0, -30)
  line L5 (0, -30) -> (0, 0)
  line L6 (0, -30) -> (8, -30) projected
  line L7 (8, -30) -> (123, -30)
  line L8 (123, -30) -> (123, 0)
  line L9 (123, 0) -> (8, 0)
  line L10 (8, 0) -> (8, -30)
  point P0 (118, 0)
extrude "Extrusion31" cut sketch "Sketch29" against normal blind 100 contours L9 L8 L7 L1
sketch "Sketch30" plane through (-137.6, 0, 118) normal (0, 0, 1) x (1, 0, 0)
  line L0 (-15, 23) -> (-15, -30) projected
  line L1 (-15, 23) -> (-15, -15)
  line L2 (-15, 23) -> (-15, -30) projected
  line L3 (-70, -15) -> (-65, -15) projected
  line L4 (-65, -15) -> (-15, -15)
  line L5 (0, 0) -> (0, -30) projected
  line L6 (0, -30) -> (-25, -30)
  line L7 (-25, -30) -> (-25, -11)
  line L8 (-25, -11) -> (0, -11)
  line L9 (0, -11) -> (0, -30)
  line L10 (0, -11) -> (-25, -30)
  point P0 (137.6, 0)
  point P1 (-15, 0)
  dimension "d158" = 25
  dimension "d159" = 19
extrude "Extrusion32" cut sketch "Sketch30" against normal blind 10 contours L5 L6 L0 L10 | L0 L6 L10
chamfer "Chamfer3" distance 7 angle 60 1 edges at (-85, -22, -35) measured on face at (-113.3333, -24.6667, -35)
chamfer "Chamfer4" distance 5 angle 45 2 edges at (-207.6, -15, -16) (-207.6, -15, 114)
chamfer "Chamfer5" distance 7 angle 75 1 edges at (-152.6, -15, -5) measured on face at (-152.6, 15.3333, 31)
chamfer "Chamfer6" distance 11 angle 45 1 edges at (-137.6, -11, 114)
sketch "Sketch31" plane through (0, 0, 118) normal (0, 0, 1) x (1, 0, 0)
  line L0 (-162.6, -30) -> (-207.6, -30) projected
  line L1 (-162.6, -30) -> (-146.3578, -17.6559)
  line L2 (-146.3578, -17.6559) -> (-103.4655, 14.9422)
  line L3 (-115, 0) -> (-126, 0) projected
  line L4 (-137.6, 0) -> (-146.3578, -17.6559) projected
  line L5 (-123.1263, 0) -> (-137.6, 0)
  line L6 (-137.6, 0) -> (-146.3578, -17.6559)
  line L7 (-146.3578, -17.6559) -> (-123.1263, 0)
  line L8 (-137.6, 0) -> (-152.6, 0) projected
  line L9 (-137.6, 0) -> (-123.1263, 0)
  point P0 (0, 0)
extrude "Extrusion33" add sketch "Sketch31" against normal blind 8
sketch "Sketch32" plane through (0, 23, 0) normal (0, 1, 0) x (1, 0, 0)
  line L0 (-144.6, 12) -> (-144.6, -110) projected
  line L1 (-152.6, -110) -> (-152.6, -118) projected
  line L2 (-144.6, 12) -> (-152.6, 12)
  line L3 (-152.6, 12) -> (-152.6, -110)
  line L4 (-152.6, -110) -> (-144.6, -110)
  line L5 (-144.6, -110) -> (-144.6, 12)
  point P0 (0, 0)
extrude "Extrusion34" cut sketch "Sketch32" against normal blind 4
chamfer "Chamfer7" distance 11 angle 60 1 edges at (-144.6, 8, 49) measured on face at (-144.6, 11.6667, 69.3333)
properties part number "mount_for_plugs"
